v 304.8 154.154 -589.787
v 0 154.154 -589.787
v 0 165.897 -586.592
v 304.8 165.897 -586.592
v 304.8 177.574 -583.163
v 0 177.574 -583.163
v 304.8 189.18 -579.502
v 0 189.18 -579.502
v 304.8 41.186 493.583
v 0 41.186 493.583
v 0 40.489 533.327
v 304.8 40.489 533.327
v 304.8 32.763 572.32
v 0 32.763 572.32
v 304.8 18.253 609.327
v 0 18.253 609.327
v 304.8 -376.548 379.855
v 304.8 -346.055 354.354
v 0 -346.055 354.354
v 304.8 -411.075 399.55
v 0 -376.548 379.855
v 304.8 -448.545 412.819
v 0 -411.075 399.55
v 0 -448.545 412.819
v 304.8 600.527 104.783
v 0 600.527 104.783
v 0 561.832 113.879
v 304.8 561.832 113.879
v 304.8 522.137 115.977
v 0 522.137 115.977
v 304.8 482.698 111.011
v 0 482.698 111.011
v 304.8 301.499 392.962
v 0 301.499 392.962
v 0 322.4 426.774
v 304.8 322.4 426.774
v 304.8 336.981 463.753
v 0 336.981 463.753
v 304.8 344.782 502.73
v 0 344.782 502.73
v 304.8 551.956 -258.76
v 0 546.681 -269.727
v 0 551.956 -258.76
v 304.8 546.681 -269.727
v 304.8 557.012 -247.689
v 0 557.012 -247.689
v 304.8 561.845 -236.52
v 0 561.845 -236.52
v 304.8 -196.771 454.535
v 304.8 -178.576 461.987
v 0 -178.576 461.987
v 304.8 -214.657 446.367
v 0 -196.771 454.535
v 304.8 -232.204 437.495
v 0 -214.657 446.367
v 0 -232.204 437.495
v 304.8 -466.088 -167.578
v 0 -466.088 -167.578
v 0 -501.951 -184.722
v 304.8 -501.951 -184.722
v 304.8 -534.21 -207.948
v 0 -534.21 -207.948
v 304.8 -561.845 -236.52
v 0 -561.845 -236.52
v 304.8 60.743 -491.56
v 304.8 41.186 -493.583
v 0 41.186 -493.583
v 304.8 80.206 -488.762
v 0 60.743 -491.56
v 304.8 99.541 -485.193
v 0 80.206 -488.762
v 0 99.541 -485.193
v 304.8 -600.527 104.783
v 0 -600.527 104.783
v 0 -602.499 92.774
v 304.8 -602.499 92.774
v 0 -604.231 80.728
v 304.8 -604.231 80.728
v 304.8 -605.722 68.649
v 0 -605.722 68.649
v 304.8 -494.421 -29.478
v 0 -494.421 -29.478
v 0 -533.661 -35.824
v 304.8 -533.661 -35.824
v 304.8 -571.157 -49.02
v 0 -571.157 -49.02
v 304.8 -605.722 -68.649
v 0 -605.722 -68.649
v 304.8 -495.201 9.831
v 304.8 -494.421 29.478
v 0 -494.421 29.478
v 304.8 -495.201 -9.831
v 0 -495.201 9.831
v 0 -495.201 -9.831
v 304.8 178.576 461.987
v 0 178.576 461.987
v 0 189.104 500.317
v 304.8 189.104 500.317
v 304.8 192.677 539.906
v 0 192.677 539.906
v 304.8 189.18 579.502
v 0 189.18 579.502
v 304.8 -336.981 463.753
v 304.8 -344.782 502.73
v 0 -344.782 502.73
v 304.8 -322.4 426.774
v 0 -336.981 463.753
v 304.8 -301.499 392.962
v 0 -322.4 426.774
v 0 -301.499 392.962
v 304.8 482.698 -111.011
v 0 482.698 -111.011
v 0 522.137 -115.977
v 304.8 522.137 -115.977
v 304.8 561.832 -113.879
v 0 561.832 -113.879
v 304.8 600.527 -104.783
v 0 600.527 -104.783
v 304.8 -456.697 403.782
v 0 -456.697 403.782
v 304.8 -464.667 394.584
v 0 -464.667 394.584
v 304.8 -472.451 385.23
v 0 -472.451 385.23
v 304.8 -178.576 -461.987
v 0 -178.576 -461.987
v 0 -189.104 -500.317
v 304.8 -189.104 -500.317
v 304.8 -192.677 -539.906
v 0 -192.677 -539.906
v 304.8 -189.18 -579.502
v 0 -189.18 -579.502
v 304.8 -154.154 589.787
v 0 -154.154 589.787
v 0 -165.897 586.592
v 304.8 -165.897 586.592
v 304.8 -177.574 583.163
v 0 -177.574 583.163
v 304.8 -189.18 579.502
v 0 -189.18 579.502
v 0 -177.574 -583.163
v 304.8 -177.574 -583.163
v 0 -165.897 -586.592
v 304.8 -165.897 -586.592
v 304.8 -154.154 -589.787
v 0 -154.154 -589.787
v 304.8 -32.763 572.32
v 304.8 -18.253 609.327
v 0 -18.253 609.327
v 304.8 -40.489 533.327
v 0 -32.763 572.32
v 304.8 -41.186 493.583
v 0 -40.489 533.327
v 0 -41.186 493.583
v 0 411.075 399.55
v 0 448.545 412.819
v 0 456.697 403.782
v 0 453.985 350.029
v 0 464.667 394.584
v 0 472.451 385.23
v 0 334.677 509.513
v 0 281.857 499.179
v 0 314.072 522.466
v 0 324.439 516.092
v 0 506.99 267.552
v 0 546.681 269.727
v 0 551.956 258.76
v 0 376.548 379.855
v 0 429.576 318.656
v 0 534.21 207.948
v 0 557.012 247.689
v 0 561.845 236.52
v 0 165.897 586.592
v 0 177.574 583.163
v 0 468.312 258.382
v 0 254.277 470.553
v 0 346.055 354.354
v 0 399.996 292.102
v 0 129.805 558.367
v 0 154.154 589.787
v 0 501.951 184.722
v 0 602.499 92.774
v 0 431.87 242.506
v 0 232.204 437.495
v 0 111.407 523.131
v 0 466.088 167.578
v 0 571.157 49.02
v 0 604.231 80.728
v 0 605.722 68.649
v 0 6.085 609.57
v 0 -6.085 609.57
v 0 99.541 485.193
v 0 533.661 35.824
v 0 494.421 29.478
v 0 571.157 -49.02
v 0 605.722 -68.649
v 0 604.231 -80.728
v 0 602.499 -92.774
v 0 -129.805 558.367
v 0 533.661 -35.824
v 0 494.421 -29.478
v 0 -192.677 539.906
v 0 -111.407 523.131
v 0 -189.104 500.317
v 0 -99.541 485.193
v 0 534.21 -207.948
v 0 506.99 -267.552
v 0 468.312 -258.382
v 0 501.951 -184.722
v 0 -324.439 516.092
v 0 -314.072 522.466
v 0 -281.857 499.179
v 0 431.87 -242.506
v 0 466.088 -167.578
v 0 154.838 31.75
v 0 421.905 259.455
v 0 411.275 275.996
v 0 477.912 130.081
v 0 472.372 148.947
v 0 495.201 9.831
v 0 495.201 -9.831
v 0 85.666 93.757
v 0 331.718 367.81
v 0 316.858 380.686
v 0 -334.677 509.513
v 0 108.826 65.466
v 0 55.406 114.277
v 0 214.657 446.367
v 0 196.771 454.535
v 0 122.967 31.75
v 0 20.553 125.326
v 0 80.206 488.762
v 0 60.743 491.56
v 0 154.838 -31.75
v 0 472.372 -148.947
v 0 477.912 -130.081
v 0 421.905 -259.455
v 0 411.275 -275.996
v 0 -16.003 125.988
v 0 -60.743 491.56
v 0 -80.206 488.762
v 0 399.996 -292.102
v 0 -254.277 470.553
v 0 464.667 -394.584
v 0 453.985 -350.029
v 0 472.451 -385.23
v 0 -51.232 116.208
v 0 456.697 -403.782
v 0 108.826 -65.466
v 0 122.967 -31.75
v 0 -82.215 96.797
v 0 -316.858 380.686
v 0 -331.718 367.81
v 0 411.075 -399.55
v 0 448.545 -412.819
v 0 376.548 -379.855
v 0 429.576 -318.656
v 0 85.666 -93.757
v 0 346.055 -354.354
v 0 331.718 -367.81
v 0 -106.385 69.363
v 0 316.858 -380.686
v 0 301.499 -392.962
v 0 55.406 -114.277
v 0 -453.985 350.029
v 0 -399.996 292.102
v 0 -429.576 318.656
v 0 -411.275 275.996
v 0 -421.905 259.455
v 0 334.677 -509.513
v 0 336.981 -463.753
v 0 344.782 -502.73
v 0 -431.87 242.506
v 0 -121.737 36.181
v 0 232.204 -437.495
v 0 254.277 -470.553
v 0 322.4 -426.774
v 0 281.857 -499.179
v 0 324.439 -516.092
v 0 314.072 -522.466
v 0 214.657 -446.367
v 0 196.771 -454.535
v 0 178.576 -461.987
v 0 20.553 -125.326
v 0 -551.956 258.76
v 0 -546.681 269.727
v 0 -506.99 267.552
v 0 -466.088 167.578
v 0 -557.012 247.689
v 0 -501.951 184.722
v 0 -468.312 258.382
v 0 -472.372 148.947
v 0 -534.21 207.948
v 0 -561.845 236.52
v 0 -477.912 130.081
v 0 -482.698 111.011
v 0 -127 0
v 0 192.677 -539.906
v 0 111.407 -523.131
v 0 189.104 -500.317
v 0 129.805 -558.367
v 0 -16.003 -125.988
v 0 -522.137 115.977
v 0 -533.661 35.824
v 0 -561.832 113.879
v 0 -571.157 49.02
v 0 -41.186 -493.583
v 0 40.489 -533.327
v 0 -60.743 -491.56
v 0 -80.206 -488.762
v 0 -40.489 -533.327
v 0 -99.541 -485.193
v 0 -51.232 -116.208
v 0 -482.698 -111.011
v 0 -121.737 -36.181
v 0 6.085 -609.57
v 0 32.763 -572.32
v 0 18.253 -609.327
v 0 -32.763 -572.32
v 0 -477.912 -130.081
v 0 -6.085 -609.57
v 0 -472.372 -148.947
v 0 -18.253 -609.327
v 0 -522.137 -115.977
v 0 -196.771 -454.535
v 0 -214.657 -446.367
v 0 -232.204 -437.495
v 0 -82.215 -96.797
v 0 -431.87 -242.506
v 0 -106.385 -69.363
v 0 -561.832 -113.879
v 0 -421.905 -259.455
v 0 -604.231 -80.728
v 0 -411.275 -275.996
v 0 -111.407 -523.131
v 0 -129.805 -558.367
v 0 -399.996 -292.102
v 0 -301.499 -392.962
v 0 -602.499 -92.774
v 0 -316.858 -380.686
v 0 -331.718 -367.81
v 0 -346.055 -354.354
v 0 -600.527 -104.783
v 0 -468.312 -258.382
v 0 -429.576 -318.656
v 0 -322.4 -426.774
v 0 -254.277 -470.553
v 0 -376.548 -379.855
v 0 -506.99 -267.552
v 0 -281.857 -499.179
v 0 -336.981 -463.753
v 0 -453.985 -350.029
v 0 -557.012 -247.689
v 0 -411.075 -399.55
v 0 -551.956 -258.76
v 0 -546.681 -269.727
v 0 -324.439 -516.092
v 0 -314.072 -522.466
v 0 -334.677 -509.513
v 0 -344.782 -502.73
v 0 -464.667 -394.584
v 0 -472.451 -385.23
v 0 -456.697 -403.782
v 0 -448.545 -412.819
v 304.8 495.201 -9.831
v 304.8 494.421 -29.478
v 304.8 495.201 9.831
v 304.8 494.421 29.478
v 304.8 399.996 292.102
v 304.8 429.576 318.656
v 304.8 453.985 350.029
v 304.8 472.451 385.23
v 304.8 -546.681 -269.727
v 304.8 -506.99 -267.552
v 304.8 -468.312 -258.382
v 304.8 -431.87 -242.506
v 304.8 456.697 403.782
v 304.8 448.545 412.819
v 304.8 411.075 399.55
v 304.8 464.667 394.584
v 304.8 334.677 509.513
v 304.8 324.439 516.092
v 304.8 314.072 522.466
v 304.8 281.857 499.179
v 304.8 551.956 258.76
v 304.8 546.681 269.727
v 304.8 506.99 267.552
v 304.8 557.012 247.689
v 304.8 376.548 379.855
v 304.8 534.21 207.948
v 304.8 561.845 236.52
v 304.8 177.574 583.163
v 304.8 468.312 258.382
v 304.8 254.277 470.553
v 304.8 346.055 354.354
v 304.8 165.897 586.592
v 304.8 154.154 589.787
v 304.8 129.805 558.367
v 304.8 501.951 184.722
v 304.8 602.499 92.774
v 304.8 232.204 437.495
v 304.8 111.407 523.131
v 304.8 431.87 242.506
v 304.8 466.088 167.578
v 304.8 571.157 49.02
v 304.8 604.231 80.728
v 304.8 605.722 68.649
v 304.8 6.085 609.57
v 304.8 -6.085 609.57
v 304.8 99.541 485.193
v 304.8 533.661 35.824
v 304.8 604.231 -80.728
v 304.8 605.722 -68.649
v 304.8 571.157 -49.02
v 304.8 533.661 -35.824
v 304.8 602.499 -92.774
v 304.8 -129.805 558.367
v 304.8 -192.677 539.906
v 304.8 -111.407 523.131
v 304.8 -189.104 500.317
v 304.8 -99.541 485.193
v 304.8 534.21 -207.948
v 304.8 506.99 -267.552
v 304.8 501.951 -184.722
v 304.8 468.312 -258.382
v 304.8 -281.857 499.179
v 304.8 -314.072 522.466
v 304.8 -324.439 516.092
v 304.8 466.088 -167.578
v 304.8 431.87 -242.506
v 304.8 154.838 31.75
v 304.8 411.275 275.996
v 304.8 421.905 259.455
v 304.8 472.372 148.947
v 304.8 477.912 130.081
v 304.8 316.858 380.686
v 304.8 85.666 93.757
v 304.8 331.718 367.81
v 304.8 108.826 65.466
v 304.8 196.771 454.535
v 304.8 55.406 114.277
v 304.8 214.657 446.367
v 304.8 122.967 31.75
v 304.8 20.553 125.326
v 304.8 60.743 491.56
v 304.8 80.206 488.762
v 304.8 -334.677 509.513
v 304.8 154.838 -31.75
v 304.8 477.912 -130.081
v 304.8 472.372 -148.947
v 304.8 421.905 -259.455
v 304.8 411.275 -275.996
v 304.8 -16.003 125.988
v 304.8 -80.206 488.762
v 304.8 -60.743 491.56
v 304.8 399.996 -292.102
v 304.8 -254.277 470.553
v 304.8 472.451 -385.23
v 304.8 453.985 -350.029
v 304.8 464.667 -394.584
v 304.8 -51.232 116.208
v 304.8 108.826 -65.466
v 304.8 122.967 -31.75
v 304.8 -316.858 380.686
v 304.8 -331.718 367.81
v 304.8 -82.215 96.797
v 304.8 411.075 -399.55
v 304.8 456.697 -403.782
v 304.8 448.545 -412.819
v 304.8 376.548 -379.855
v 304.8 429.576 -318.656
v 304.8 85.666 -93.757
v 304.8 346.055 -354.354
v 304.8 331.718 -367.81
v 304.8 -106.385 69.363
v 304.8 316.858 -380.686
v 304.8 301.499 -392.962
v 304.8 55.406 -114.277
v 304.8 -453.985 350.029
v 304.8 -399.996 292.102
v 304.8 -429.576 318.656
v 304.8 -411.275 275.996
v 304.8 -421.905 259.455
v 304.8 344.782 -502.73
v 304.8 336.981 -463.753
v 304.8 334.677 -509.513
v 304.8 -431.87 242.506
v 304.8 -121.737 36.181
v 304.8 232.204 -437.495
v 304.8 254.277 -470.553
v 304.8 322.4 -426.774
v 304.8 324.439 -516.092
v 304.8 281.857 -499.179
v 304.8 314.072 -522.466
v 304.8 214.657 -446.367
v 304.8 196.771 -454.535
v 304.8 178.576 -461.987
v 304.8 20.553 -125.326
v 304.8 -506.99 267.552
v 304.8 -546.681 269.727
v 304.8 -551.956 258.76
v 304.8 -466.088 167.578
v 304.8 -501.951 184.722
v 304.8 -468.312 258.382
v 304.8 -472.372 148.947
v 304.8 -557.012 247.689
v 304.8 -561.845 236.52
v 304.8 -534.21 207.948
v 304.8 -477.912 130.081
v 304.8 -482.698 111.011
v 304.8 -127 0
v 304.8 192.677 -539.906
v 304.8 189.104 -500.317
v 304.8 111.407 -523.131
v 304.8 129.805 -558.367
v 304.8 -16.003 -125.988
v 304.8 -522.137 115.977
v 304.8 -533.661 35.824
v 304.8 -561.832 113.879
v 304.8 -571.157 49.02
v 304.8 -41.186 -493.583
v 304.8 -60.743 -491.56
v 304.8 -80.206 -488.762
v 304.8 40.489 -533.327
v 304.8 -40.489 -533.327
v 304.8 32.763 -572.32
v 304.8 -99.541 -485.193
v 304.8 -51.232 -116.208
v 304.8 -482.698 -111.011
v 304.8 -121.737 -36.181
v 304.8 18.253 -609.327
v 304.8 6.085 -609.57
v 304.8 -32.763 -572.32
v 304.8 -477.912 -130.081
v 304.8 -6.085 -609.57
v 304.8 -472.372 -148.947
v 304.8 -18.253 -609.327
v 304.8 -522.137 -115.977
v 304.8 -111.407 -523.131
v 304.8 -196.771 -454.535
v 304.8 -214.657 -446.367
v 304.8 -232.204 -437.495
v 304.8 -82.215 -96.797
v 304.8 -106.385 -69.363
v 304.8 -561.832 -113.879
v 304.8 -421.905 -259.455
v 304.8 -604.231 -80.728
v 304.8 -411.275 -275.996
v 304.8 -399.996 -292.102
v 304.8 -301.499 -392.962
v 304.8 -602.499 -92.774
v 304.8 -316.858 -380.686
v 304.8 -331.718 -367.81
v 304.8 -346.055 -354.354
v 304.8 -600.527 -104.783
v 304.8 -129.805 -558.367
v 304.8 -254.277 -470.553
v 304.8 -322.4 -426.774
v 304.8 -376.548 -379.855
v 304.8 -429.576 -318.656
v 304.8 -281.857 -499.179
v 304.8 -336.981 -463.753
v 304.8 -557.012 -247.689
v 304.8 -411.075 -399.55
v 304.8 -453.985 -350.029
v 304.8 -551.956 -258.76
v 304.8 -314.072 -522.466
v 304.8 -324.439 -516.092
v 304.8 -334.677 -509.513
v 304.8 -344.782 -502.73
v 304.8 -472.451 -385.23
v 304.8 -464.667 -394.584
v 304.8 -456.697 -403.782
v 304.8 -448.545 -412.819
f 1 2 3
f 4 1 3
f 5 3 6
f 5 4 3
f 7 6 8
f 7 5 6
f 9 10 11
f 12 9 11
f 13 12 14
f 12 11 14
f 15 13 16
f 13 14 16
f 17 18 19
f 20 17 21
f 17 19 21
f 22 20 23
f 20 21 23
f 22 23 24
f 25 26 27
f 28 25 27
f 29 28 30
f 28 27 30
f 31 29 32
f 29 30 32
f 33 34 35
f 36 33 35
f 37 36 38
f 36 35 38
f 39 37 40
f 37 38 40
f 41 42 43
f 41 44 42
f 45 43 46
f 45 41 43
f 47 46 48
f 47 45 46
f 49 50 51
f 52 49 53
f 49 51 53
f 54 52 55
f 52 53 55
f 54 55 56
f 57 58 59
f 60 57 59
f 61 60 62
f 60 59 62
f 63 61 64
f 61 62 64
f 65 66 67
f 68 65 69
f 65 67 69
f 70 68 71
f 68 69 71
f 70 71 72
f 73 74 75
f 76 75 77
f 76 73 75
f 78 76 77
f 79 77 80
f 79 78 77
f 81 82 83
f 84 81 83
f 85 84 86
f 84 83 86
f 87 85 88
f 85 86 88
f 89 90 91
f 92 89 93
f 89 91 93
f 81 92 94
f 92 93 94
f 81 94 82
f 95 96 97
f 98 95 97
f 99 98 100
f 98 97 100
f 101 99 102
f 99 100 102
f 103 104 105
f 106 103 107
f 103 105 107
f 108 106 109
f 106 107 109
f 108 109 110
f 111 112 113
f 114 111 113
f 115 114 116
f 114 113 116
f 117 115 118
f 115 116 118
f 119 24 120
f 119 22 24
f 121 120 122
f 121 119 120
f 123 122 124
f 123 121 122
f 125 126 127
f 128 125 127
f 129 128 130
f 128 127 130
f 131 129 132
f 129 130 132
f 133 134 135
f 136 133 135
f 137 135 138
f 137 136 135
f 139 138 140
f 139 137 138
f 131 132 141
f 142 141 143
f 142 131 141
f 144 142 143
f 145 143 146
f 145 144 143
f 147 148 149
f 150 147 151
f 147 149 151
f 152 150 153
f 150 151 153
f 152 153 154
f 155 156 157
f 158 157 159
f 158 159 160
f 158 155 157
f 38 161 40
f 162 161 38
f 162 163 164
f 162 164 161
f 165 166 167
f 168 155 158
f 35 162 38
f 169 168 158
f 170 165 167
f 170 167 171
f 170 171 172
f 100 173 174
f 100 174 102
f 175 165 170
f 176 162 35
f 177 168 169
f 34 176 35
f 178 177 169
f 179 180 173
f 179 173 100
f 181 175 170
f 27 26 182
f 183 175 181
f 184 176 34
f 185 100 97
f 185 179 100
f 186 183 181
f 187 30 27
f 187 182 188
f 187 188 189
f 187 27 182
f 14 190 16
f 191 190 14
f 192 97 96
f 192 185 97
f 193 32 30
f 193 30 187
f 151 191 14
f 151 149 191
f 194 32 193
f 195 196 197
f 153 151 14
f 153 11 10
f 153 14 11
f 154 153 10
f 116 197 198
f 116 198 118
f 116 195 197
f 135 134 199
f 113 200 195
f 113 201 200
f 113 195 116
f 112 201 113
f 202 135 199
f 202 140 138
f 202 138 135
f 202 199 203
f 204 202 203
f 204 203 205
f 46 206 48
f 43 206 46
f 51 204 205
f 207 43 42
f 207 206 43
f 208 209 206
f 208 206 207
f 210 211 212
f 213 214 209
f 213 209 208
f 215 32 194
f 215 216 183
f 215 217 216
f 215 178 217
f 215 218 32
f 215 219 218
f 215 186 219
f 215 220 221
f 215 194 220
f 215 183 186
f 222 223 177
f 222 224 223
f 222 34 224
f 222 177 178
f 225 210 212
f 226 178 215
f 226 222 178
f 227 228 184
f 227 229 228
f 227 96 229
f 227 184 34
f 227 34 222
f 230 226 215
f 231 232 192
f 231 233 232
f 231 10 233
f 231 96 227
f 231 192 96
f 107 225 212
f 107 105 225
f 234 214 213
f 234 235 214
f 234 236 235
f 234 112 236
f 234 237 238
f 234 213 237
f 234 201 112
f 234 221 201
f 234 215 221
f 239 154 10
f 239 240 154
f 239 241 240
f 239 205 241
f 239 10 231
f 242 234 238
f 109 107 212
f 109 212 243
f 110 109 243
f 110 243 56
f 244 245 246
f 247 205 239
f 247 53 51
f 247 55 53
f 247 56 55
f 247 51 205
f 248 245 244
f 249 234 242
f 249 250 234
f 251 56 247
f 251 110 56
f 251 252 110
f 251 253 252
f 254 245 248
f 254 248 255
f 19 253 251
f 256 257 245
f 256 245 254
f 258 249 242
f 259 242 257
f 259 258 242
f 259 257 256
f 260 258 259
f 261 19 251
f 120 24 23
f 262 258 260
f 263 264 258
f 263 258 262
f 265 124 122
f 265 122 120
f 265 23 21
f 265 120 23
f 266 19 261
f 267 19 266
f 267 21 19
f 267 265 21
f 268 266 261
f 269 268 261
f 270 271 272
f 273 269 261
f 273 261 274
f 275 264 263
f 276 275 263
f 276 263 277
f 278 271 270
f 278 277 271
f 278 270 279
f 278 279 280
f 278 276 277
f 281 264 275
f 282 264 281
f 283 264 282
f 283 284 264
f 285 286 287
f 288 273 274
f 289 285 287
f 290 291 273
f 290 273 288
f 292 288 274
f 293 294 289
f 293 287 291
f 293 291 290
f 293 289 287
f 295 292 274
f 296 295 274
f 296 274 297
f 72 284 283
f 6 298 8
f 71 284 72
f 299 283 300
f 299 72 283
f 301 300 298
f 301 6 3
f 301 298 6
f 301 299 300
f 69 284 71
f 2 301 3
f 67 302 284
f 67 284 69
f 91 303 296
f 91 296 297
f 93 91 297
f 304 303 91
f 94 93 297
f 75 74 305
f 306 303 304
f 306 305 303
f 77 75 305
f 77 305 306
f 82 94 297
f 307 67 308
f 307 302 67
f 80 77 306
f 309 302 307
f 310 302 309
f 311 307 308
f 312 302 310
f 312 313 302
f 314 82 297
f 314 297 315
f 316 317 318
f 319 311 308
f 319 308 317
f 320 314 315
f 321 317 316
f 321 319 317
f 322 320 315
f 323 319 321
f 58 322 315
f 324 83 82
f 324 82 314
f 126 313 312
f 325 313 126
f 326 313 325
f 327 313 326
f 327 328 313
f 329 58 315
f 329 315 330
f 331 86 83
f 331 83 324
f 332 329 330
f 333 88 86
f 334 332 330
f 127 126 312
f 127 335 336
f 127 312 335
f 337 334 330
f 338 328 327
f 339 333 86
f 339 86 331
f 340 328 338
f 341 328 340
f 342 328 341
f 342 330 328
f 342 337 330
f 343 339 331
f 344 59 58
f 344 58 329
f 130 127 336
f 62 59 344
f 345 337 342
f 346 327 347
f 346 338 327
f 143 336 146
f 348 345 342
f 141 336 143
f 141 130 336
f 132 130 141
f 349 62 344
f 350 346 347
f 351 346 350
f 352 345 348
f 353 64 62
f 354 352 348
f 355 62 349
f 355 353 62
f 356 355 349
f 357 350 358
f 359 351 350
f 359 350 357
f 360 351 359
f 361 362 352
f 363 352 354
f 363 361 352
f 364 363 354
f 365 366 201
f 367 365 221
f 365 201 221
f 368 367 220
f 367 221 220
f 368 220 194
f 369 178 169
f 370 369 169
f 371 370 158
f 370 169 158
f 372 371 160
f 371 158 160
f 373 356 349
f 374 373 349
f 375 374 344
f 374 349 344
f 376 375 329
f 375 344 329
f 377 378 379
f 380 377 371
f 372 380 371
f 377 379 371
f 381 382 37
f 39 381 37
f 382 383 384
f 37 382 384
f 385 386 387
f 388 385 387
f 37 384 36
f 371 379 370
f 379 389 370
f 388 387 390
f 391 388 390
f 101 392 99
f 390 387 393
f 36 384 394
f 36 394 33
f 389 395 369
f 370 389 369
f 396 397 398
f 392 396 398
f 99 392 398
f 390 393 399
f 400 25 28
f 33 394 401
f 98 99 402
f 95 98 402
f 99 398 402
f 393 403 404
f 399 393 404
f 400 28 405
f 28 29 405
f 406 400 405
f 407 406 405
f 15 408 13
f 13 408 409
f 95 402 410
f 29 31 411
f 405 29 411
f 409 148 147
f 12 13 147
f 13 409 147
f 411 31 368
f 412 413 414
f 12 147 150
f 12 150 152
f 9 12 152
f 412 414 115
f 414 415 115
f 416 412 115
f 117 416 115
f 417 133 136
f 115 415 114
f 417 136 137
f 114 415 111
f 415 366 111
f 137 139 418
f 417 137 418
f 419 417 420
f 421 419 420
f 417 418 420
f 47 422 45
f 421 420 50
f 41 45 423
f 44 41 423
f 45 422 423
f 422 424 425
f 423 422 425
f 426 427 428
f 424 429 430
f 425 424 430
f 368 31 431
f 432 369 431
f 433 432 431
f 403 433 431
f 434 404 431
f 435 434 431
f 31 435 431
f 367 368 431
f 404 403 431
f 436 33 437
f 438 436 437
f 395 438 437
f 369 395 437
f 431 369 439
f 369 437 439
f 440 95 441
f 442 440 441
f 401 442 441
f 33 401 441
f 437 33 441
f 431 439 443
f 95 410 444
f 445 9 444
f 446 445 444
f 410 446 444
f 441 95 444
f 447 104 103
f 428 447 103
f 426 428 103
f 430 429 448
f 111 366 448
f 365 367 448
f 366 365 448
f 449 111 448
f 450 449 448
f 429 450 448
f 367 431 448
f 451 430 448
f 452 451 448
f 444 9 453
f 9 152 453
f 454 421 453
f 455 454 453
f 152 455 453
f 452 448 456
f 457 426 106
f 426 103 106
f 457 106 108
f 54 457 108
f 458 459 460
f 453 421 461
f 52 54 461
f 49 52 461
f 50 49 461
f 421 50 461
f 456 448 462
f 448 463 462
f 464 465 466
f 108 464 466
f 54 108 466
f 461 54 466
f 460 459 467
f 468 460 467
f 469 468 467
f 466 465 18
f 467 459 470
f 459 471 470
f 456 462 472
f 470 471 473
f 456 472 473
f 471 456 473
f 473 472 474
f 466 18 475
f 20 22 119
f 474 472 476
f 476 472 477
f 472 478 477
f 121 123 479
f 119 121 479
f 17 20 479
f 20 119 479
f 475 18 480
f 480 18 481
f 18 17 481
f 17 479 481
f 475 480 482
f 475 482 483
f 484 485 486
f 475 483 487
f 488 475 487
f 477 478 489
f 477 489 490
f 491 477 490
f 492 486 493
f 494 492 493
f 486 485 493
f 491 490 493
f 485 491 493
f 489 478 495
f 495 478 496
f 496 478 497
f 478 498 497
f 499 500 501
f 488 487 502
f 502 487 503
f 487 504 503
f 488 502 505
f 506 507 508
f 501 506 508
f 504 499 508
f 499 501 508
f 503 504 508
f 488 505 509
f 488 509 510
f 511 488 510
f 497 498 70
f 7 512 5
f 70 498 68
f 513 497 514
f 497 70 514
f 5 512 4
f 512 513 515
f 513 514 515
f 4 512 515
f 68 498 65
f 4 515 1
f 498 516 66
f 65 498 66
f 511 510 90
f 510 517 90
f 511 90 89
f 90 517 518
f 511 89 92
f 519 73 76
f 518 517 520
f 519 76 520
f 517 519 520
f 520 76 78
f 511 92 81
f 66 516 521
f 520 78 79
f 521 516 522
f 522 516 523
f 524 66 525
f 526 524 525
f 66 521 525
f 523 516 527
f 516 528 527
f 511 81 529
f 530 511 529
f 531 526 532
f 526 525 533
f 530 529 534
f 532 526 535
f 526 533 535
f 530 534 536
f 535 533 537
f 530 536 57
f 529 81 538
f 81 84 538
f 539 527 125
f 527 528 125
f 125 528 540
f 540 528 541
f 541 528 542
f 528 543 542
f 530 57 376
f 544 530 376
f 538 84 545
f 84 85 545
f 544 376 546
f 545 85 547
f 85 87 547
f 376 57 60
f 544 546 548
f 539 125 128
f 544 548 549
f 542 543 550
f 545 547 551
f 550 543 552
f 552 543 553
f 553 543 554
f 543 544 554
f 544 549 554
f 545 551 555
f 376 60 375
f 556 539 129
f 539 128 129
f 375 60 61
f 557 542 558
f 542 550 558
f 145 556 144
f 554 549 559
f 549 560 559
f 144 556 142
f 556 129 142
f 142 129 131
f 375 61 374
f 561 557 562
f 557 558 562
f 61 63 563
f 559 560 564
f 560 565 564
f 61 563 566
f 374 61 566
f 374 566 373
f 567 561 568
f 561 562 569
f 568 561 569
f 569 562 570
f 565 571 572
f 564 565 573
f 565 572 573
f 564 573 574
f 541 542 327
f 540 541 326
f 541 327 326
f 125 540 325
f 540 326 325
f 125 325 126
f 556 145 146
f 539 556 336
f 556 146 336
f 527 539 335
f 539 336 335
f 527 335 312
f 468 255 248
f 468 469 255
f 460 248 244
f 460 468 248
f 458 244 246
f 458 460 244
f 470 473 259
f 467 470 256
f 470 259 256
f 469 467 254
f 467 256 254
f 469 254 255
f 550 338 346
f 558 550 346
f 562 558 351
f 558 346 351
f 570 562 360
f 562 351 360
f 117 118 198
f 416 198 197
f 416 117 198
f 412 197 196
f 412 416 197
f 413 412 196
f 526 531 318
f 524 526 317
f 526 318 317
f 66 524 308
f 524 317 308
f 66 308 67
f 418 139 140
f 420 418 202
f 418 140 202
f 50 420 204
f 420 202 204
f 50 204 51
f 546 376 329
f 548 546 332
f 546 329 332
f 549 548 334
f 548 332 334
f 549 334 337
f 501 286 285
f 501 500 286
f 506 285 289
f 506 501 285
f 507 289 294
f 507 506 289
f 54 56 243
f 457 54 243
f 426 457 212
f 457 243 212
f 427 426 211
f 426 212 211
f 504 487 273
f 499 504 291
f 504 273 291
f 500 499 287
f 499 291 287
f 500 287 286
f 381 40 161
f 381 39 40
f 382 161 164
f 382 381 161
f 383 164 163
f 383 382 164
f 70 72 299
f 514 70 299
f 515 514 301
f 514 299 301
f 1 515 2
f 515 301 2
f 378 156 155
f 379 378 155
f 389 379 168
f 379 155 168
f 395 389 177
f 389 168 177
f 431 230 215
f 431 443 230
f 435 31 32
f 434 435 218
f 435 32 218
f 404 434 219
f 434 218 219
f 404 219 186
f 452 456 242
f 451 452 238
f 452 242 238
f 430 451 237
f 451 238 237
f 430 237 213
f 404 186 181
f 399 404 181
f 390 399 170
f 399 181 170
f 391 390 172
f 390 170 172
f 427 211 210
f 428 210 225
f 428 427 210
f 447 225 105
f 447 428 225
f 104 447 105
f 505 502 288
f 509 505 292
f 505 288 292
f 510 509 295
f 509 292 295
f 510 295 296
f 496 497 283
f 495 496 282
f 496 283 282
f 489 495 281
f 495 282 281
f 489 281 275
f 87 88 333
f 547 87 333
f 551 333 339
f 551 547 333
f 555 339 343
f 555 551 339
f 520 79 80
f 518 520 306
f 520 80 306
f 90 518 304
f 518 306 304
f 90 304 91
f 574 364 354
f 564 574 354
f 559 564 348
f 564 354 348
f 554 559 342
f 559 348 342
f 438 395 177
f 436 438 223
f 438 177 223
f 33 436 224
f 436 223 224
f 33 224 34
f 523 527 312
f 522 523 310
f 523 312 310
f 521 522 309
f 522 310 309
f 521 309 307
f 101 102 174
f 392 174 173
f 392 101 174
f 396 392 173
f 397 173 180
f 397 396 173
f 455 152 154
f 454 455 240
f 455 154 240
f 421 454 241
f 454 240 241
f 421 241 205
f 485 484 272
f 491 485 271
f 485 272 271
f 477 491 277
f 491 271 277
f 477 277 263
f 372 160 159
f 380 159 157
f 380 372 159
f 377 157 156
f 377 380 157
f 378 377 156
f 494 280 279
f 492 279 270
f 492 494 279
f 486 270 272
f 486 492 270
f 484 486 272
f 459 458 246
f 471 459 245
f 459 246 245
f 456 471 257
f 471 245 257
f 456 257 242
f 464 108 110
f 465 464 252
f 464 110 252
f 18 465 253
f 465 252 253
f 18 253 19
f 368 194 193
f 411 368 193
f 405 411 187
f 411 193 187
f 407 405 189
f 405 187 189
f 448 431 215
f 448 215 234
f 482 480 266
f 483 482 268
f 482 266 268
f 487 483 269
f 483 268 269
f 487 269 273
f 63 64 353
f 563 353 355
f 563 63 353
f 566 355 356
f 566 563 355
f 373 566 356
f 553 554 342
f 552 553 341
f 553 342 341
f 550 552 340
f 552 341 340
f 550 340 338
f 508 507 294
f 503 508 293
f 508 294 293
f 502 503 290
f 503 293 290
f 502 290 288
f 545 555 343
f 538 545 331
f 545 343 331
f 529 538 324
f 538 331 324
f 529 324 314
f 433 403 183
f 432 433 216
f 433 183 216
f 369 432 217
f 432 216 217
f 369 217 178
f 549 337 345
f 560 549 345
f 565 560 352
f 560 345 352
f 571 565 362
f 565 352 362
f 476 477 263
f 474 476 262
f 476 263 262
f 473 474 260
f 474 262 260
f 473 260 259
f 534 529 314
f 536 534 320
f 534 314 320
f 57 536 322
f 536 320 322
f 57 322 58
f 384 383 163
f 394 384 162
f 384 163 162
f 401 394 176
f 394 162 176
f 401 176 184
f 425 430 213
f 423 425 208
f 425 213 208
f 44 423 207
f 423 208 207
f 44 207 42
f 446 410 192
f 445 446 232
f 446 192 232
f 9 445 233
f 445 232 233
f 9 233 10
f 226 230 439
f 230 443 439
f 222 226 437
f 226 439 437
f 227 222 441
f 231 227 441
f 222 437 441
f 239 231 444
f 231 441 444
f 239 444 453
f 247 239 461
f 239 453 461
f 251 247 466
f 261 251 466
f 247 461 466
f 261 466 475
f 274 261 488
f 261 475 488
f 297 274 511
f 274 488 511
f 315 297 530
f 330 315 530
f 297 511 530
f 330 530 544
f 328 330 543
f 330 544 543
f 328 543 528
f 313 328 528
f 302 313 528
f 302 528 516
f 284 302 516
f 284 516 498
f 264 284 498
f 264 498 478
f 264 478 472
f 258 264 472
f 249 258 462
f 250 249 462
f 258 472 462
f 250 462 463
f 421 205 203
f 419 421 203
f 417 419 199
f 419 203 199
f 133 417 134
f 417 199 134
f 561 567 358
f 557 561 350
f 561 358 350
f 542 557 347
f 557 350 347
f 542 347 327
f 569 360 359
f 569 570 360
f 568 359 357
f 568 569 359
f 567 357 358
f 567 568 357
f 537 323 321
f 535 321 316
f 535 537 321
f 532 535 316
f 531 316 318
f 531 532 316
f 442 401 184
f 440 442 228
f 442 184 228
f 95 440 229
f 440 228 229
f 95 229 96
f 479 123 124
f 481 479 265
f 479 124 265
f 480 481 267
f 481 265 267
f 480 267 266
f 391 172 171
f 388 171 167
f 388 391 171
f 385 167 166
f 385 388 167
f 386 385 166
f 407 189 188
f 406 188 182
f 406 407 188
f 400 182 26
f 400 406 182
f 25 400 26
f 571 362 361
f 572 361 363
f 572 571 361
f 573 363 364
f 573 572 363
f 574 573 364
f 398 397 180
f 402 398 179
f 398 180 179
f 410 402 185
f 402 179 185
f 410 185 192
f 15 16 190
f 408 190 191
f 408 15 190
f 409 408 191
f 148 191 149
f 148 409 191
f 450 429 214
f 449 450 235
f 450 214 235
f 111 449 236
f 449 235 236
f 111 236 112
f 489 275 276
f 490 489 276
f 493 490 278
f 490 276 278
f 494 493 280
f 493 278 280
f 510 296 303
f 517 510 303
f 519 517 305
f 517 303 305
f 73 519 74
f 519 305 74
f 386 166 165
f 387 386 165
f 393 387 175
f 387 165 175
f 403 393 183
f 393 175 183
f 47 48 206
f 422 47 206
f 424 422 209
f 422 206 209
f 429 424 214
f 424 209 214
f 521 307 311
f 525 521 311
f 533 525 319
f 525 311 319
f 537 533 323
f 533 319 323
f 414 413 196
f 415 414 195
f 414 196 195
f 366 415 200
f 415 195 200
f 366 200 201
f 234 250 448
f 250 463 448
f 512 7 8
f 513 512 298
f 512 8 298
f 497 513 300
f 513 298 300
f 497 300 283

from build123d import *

# Parameters (mm, degrees)
BASPROSKE_W     = 304.8
BASPROSKE_H     = 609.6
TOOTHCUT_DEPTH  = 915.4
TEETHCUTS_COUNT = 22
TEETHCUTS_ANGLE = 343.636363636
BORSKE_R        = 127
BORE_DEPTH      = 304.8000508
KEYSKE_W        = 63.5
KEYSKE_H        = 154.8384
KEYWAY_DEPTH    = 304.8000508


with BuildPart() as part:
    # BasProSke → Base-Revolve (revolve)
    with BuildSketch(Plane(origin=(0, 0, 0), x_dir=(1, 0, 0), z_dir=(0, 1, 0)), mode=Mode.PRIVATE) as base_revolve_sk:
        with Locations((152.4, 304.8)):
            Rectangle(BASPROSKE_W, BASPROSKE_H)
    revolve(base_revolve_sk.sketch.rotate(Axis((-10, 0, 0), (1, 0, 0)), 180), axis=Axis((-10, 0, 0), (1, 0, 0)))

    # TooCutSke → ToothCut (cut, through all)
    with BuildSketch(Plane(origin=(0, 0, 0), x_dir=(0, 0, -1), z_dir=(1, 0, 0))):
        with BuildLine():
            ThreePointArc((29.477931626, 494.420755518), (0, 495.29873), (-29.477931626, 494.420755518))
            ThreePointArc((-29.477931626, 494.420755518), (-41.591539093, 552.716510617), (-68.665781689, 605.74593581))
            ThreePointArc((-68.665781689, 605.74593581), (0, 609.6254), (68.665781689, 605.74593581))
            ThreePointArc((68.665781689, 605.74593581), (41.591539093, 552.716510617), (29.477931626, 494.420755518))
        make_face()
    toothcut = extrude(amount=TOOTHCUT_DEPTH, mode=Mode.SUBTRACT)

    # TeethCuts: ToothCut ×22 about axis
    teethcuts_axis = Axis((-10, 0, 0), (1, 0, 0))
    for i in range(1, TEETHCUTS_COUNT):
        add(toothcut.rotate(teethcuts_axis, i * TEETHCUTS_ANGLE / (TEETHCUTS_COUNT - 1)), mode=Mode.SUBTRACT)

    # BorSke → Bore (cut, symmetric)
    with BuildSketch(Plane(origin=(0, 0, 0), x_dir=(0, 0, -1), z_dir=(1, 0, 0))):
        with Locations(Location((0, 0, 0), (0, 0, 180))):
            Circle(BORSKE_R)
    extrude(amount=BORE_DEPTH, both=True, mode=Mode.SUBTRACT)

    # KeySke → Keyway (cut, symmetric)
    with BuildSketch(Plane(origin=(0, 0, 0), x_dir=(0, 0, -1), z_dir=(1, 0, 0))):
        with Locations((0, 77.4192)):
            Rectangle(KEYSKE_W, KEYSKE_H)
    extrude(amount=KEYWAY_DEPTH, both=True, mode=Mode.SUBTRACT)


solid = part.part
